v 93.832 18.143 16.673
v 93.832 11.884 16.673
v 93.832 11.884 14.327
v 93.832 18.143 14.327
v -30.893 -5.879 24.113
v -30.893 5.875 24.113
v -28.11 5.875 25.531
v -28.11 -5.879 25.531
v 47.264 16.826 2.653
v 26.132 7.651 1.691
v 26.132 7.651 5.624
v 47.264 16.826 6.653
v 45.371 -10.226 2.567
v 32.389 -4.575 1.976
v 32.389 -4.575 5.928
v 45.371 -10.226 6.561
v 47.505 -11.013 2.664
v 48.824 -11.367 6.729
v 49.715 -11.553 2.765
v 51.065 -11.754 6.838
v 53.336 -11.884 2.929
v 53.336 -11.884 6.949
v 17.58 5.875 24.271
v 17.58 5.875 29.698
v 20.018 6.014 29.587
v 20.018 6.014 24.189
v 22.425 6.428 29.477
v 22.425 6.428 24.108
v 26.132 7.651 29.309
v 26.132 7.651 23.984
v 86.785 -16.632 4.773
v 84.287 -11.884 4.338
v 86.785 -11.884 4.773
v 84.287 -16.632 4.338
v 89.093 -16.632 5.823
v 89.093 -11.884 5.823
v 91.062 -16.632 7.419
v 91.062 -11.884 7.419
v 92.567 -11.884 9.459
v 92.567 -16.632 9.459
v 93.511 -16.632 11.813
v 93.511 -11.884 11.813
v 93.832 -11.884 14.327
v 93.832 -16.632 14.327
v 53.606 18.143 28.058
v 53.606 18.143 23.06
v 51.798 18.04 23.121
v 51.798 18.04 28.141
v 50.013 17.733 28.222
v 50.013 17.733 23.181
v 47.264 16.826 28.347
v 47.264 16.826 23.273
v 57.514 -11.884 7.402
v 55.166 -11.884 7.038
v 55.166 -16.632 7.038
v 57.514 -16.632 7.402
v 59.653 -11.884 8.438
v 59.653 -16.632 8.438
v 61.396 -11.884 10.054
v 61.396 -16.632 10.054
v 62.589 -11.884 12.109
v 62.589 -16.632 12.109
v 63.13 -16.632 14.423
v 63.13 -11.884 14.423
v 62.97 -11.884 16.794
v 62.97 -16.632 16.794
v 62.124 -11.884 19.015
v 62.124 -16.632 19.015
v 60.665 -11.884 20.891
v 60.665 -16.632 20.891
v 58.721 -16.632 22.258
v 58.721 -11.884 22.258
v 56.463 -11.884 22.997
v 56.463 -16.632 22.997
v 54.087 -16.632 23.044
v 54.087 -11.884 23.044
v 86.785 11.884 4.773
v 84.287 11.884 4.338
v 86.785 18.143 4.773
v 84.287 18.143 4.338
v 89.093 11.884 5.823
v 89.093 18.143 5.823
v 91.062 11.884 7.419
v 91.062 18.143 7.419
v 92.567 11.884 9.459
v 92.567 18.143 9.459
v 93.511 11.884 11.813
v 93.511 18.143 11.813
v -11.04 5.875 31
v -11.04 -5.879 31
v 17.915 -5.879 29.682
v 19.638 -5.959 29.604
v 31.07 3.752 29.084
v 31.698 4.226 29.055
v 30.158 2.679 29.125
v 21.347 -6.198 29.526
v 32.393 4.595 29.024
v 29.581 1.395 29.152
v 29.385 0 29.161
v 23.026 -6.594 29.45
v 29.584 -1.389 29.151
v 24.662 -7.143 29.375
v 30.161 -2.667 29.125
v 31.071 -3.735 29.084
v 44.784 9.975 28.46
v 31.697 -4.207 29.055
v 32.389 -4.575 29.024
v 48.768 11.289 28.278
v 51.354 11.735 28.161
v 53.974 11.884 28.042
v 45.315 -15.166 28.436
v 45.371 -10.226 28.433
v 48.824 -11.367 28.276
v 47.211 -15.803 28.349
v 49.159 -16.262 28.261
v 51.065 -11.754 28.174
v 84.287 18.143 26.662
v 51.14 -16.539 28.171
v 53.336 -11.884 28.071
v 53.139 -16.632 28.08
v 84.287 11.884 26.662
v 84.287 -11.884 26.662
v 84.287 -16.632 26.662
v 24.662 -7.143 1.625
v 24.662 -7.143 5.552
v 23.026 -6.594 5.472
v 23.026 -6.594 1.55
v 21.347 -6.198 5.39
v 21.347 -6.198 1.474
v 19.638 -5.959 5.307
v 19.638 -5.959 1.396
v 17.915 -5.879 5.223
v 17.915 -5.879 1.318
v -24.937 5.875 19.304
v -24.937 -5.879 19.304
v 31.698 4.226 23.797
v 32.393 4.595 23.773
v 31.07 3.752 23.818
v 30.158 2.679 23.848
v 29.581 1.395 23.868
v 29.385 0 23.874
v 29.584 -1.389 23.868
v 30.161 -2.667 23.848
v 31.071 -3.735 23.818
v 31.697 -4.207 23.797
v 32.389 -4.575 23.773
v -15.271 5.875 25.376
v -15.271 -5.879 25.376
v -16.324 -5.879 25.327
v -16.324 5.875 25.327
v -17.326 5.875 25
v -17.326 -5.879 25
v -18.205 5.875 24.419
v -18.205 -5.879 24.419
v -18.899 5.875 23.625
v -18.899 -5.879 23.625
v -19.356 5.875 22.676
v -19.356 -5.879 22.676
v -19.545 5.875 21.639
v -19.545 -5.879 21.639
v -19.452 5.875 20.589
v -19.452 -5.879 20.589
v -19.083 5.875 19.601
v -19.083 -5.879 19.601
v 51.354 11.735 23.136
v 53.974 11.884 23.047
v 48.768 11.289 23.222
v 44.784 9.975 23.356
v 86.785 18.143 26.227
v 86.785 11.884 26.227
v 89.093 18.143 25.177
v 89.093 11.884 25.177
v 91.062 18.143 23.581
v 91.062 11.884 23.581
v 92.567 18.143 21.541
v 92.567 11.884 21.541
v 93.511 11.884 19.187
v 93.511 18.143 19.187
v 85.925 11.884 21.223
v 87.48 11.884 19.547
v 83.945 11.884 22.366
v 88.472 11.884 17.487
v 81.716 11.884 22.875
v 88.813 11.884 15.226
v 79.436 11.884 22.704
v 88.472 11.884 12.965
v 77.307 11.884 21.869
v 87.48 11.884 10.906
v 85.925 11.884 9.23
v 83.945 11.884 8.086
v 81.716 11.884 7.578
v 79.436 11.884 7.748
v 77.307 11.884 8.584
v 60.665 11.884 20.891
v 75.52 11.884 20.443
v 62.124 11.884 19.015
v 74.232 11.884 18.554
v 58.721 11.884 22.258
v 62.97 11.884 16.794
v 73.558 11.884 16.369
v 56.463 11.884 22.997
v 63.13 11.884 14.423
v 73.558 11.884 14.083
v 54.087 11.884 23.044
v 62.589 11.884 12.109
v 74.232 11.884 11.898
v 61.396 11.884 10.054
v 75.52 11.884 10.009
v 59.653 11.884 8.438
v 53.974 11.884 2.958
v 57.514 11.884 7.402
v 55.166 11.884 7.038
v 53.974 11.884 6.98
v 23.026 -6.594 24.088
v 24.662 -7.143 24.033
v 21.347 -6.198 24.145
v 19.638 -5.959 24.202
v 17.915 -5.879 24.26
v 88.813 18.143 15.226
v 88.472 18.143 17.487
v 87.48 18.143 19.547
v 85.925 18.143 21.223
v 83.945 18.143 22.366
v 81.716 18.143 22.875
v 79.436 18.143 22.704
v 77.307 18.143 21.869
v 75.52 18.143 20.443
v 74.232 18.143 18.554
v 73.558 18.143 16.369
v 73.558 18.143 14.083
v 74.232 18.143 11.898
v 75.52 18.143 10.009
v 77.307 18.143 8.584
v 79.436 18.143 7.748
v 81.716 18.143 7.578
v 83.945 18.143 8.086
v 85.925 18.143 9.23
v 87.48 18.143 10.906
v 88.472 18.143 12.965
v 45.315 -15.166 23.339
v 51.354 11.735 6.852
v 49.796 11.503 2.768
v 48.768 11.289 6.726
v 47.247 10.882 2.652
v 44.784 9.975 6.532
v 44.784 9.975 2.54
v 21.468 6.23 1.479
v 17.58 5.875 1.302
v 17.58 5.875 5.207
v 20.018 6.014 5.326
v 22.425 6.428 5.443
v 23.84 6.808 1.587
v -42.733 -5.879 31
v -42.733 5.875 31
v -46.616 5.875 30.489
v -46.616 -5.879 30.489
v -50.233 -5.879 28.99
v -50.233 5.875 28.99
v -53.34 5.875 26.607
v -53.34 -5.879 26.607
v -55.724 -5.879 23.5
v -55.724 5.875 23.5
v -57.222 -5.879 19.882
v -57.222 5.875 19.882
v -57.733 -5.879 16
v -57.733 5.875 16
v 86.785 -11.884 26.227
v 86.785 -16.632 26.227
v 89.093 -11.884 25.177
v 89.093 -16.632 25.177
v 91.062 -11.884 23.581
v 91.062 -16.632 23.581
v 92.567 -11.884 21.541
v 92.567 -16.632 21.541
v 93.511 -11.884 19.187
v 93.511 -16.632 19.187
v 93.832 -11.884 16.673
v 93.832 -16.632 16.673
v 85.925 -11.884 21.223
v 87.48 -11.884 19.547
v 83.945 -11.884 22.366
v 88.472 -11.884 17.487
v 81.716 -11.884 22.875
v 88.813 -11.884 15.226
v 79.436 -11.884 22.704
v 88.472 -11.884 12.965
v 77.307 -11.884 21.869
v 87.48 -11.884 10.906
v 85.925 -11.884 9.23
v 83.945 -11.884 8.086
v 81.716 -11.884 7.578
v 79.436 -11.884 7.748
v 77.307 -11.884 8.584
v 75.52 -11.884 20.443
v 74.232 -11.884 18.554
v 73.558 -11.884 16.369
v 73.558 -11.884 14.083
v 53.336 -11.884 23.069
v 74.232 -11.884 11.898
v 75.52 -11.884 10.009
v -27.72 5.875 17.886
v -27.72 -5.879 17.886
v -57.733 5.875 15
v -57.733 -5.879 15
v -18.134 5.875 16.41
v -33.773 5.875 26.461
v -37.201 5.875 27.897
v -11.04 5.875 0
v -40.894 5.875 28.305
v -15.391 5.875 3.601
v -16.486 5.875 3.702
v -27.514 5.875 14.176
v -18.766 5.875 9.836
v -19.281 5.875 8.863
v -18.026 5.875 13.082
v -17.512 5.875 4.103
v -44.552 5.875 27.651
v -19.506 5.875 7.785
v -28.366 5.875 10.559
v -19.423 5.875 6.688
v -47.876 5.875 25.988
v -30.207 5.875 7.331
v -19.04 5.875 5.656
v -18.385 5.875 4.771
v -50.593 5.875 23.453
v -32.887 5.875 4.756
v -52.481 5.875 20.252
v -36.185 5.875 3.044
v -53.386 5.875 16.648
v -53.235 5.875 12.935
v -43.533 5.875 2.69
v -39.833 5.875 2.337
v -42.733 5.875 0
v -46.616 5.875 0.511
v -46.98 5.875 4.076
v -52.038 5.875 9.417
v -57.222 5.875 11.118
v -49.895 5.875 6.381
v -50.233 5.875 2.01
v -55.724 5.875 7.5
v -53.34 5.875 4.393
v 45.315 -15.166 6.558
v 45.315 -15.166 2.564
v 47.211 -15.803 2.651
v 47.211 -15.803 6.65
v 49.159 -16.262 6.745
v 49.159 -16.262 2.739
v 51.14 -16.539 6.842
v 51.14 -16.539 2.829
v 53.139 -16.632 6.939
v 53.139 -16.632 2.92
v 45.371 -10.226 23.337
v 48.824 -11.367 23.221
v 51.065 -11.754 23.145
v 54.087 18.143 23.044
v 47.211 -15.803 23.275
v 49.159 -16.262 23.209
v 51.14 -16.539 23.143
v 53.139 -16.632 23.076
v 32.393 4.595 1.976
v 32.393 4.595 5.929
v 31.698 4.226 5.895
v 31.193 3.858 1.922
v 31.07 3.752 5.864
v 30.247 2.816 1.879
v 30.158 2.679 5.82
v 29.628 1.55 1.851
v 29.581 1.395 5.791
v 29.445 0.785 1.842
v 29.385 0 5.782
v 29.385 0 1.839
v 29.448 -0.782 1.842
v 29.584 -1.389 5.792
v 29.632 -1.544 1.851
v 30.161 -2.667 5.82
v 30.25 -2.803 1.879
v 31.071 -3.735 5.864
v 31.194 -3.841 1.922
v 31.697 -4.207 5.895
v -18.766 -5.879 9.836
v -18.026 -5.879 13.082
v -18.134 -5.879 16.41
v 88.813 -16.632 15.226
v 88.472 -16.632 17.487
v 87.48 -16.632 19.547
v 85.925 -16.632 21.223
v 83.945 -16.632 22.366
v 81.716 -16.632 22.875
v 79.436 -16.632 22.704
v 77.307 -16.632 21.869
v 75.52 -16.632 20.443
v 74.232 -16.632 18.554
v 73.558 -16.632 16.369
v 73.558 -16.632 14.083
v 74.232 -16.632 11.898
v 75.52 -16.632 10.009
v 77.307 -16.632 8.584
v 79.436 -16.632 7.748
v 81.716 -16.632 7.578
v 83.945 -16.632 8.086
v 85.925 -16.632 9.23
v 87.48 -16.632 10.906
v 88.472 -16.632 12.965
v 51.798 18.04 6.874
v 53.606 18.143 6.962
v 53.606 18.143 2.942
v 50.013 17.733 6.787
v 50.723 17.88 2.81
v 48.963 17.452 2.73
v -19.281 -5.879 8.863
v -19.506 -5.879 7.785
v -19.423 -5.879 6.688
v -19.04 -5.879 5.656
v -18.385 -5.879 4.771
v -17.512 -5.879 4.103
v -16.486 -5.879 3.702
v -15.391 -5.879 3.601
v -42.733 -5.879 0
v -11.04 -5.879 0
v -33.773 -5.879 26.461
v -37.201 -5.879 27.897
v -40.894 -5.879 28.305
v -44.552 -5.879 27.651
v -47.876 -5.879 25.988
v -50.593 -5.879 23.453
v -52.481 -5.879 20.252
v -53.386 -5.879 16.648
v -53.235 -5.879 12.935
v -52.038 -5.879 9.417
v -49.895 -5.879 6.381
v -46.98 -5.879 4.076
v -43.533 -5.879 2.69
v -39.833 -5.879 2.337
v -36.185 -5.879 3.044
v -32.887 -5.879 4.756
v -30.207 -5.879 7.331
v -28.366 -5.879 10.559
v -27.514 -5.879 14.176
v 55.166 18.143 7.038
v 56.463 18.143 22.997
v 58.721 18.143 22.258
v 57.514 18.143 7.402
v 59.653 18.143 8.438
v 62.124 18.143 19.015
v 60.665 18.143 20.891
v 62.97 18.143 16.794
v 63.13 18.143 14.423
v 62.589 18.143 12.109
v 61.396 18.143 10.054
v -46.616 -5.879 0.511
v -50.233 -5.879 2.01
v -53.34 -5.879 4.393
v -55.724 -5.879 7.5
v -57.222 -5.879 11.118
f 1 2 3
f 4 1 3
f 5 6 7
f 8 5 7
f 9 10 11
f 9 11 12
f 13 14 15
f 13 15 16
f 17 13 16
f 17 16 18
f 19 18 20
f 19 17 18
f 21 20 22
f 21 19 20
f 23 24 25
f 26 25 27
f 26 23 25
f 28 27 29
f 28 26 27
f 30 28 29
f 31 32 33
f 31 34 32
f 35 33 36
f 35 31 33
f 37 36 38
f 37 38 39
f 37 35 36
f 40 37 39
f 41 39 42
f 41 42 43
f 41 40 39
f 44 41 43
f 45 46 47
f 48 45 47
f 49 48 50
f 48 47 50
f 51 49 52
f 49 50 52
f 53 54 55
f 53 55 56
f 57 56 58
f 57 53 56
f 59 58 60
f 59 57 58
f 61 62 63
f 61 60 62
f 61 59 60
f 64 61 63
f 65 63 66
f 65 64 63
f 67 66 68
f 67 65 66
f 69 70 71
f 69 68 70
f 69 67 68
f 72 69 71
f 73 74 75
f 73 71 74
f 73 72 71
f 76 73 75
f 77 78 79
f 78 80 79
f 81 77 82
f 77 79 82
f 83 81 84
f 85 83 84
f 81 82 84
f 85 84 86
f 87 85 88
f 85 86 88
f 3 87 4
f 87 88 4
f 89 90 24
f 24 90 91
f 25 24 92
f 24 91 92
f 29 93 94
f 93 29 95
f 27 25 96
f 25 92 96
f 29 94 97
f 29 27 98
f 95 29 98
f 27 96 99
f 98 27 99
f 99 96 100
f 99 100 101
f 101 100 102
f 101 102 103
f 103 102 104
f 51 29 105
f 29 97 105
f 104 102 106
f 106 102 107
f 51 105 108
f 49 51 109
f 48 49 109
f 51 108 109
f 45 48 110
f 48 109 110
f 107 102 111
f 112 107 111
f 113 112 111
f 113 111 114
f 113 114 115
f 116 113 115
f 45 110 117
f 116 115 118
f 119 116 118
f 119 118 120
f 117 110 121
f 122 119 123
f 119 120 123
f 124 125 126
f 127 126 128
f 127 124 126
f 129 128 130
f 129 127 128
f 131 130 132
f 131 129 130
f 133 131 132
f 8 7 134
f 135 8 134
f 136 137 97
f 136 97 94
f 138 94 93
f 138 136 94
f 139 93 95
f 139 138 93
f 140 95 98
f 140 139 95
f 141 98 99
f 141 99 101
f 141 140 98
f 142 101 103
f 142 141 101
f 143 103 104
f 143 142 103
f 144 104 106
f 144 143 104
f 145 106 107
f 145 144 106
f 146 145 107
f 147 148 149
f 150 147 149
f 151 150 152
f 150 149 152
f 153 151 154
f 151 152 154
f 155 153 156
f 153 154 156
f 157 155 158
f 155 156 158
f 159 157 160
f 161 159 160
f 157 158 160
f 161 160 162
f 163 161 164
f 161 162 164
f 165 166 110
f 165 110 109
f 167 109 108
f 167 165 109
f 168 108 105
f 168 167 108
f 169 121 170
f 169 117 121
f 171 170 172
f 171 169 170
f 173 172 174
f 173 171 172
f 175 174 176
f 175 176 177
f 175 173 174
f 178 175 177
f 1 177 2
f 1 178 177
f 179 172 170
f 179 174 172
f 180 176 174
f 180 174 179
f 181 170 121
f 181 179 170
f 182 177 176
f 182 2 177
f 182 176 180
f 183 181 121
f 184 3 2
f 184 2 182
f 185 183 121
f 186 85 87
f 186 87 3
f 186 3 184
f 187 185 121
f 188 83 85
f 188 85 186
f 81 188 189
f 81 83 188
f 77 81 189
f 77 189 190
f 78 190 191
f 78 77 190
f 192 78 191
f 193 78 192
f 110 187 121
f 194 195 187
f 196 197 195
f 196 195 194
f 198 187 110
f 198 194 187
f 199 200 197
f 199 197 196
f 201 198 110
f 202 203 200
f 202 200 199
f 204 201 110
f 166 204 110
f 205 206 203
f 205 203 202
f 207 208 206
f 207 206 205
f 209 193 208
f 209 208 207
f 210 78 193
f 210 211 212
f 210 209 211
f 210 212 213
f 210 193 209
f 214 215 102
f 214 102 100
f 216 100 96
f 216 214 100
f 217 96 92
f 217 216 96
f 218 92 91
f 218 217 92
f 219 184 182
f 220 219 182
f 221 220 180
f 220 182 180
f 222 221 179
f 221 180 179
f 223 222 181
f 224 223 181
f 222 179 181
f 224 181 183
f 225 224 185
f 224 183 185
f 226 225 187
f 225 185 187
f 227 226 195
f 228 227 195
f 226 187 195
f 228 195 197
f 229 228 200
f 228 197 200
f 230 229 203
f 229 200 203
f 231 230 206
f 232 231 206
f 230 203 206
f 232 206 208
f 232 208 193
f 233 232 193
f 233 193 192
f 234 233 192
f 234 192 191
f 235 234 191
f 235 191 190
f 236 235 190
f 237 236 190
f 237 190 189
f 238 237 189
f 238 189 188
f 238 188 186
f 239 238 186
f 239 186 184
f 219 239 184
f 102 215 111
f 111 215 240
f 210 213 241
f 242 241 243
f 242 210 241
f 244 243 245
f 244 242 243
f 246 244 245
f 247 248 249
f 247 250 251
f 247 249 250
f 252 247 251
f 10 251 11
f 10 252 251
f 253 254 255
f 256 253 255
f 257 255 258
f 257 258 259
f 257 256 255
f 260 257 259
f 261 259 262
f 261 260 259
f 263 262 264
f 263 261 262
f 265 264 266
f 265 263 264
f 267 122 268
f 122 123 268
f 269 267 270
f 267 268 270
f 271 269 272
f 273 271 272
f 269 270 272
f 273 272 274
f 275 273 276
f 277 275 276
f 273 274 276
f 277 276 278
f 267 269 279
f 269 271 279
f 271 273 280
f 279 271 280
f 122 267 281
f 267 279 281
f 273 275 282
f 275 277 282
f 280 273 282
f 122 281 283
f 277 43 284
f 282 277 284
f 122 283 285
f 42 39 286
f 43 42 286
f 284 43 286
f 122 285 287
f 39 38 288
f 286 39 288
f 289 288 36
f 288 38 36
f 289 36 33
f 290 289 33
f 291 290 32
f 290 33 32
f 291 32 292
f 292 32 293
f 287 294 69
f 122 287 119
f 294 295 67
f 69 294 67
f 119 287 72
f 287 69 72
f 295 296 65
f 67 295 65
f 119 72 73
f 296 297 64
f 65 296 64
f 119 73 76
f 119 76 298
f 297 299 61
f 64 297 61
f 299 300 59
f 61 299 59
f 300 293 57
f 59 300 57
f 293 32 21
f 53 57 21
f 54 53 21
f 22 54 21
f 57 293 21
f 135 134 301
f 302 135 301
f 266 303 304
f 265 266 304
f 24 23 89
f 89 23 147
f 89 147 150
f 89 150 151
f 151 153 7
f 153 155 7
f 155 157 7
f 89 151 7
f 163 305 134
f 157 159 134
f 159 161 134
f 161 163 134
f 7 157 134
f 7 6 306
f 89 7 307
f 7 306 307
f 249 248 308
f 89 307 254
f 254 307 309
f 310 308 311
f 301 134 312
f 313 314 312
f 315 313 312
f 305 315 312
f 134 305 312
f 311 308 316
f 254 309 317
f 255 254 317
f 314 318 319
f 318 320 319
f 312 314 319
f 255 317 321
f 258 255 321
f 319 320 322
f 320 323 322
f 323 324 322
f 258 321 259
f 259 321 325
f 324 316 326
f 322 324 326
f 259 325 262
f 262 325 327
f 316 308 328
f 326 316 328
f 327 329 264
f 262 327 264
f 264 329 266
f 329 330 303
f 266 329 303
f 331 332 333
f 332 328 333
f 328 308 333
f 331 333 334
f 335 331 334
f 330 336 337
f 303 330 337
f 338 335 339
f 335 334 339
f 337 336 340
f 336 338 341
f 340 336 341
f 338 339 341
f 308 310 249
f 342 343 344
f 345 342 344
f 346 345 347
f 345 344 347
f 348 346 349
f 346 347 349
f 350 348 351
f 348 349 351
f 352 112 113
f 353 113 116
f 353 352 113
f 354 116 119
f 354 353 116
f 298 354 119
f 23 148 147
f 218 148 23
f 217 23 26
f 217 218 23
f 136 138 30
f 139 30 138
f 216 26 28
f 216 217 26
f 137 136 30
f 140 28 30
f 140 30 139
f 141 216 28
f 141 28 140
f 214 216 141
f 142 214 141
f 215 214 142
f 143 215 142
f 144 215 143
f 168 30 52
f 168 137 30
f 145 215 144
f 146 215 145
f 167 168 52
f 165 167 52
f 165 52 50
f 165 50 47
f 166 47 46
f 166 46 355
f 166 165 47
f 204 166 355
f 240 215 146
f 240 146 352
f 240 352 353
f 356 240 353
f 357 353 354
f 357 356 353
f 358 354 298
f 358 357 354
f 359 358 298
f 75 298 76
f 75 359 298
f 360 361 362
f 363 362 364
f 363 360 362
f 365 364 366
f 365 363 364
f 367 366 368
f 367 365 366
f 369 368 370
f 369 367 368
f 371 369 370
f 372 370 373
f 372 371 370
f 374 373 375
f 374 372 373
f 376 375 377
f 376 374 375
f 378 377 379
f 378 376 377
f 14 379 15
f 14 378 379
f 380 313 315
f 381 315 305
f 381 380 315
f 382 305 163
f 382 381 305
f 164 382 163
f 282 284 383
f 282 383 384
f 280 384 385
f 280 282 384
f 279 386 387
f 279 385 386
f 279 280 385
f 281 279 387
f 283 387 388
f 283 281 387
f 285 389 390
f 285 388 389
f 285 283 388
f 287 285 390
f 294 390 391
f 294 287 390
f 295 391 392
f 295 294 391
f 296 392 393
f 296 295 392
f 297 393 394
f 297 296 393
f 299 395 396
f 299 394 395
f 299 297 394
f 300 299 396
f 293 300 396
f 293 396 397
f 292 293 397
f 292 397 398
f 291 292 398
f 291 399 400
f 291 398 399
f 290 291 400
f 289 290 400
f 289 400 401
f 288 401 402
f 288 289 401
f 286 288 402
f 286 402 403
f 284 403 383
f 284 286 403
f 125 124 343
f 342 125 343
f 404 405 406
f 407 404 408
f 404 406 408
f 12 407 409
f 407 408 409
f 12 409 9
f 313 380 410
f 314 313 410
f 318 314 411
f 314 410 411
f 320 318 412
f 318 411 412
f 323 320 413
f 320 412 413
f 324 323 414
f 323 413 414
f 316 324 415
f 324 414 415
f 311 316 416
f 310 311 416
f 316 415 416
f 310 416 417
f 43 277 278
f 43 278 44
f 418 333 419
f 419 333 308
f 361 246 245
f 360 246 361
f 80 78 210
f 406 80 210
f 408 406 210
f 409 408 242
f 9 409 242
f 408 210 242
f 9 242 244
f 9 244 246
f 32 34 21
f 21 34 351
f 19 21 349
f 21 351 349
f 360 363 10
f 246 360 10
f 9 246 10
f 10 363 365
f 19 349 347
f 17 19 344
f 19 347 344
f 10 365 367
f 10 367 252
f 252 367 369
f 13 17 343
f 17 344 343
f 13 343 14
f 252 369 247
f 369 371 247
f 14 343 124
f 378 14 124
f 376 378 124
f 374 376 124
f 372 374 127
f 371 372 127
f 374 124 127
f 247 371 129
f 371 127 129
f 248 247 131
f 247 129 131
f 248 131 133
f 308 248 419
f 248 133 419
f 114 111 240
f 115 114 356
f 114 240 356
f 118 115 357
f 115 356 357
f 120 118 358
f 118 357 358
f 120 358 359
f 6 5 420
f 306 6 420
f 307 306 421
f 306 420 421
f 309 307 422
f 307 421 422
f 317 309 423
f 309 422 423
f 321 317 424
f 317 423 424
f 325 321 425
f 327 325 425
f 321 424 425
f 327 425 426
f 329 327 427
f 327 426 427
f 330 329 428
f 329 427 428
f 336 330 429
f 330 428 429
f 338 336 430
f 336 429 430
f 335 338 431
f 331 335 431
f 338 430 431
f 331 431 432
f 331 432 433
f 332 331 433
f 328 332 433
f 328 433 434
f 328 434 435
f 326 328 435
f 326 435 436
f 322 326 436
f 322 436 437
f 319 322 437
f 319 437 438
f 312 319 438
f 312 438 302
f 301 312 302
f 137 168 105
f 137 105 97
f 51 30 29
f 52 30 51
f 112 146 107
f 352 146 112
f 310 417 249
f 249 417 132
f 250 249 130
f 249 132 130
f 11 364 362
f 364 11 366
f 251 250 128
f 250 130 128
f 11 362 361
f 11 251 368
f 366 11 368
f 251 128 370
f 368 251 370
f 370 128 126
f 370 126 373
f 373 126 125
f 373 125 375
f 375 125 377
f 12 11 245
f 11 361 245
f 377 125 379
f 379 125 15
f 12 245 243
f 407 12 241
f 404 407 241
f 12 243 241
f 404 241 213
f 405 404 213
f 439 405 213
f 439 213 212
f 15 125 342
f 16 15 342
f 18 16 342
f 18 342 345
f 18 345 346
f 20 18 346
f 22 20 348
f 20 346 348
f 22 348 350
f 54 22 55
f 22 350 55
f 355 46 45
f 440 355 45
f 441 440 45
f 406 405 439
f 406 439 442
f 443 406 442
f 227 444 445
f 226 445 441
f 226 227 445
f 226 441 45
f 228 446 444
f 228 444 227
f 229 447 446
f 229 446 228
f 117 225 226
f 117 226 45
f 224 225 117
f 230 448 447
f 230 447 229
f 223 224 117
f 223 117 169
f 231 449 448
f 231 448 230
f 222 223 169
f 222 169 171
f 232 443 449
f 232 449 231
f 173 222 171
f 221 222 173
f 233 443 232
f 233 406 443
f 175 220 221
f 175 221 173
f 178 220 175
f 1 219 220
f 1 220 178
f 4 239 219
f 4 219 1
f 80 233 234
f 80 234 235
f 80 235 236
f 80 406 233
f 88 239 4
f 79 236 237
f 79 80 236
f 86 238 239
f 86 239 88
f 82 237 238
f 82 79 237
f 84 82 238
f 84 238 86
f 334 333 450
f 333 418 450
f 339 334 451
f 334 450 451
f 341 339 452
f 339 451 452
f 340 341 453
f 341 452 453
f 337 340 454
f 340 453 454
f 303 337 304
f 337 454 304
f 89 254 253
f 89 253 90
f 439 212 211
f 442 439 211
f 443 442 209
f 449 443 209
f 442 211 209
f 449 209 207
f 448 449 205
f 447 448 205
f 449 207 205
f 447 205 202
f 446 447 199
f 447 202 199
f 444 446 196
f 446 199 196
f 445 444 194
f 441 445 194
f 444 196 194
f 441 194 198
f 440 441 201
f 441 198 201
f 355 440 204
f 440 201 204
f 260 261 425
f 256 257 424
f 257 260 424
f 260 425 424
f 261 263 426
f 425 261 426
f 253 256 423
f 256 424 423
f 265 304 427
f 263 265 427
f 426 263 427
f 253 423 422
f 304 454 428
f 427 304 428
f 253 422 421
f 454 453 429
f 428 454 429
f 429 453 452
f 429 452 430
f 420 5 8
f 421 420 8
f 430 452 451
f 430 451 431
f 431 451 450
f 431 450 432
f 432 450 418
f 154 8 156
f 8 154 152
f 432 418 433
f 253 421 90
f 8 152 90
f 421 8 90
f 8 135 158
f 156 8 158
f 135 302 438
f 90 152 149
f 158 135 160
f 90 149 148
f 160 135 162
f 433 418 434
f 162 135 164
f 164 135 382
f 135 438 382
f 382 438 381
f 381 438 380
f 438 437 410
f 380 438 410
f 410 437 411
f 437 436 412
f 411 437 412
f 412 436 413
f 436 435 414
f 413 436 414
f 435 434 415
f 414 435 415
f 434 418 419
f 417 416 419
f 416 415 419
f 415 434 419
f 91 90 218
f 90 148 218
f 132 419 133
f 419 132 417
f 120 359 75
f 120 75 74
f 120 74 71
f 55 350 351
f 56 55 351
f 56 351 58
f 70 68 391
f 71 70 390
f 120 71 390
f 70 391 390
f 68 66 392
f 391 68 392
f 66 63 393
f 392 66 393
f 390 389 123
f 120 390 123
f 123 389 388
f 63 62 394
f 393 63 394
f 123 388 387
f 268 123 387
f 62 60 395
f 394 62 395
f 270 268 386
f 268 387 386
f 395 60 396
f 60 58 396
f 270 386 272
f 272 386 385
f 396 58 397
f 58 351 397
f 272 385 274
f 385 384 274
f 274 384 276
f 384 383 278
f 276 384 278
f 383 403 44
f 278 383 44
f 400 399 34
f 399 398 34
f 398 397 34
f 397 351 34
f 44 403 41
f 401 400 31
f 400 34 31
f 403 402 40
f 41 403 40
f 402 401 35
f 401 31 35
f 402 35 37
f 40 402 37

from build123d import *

# Parameters (mm, degrees)
PAD_DEPTH            = 31
FILLET_R             = 15
POCKET_DEPTH         = 24.023168
FILLET001_R          = 15
POCKET001_DEPTH      = 18.144337
POCKET001_DEPTH_BACK = -16.633037
FILLET002_R          = 10
SKETCH003_R          = 7.670171
POCKET002_DEPTH      = 18.144337
POCKET002_DEPTH_BACK = -16.633037
POCKET003_DEPTH      = 18.144337
POCKET003_DEPTH_BACK = -16.633037


with BuildPart() as part:
    # Sketch → Pad (new body)
    with BuildSketch(Plane.XY):
        with BuildLine():
            Line((17.5802, 5.874869), (-57.733299, 5.874869))
            Line((-57.733299, 5.874869), (-57.733299, -5.878831))
            Line((-57.733299, -5.878831), (17.914803, -5.878831))
            ThreePointArc((24.661976, -7.143267), (21.347118, -6.197668), (17.914803, -5.878831))
            Line((24.661976, -7.143267), (45.314852, -15.165812))
            ThreePointArc((45.314852, -15.165812), (49.158723, -16.262318), (53.138796, -16.632037))
            Line((53.138796, -16.632037), (98.306877, -16.632037))
            Line((98.306877, -16.632037), (98.306877, -11.884055))
            Line((98.306877, -11.884055), (53.335909, -11.884055))
            ThreePointArc((45.371277, -10.225885), (49.268204, -11.465115), (53.335909, -11.884055))
            Line((32.389291, -4.575495), (45.371277, -10.225885))
            ThreePointArc((32.39346, 4.595455), (29.384719, 0.011347), (32.389291, -4.575495))
            Line((44.784154, 9.975093), (32.39346, 4.595455))
            ThreePointArc((53.974339, 11.884055), (49.281162, 11.401775), (44.784154, 9.975093))
            Line((98.300218, 11.884055), (53.974339, 11.884055))
            Line((98.300218, 18.143337), (98.300218, 11.884055))
            Line((53.605767, 18.143337), (98.300218, 18.143337))
            ThreePointArc((53.605767, 18.143337), (50.367046, 17.81052), (47.2637, 16.825979))
            Line((26.131771, 7.651179), (47.2637, 16.825979))
            ThreePointArc((17.5802, 5.874869), (21.947254, 6.323636), (26.131771, 7.651179))
        make_face()
    extrude(amount=PAD_DEPTH)

    # Fillet
    fillet_edges = [part.edges().sort_by_distance(p)[0] for p in [
        (98.306877, -14.258046, 31),
        (98.300218, 15.013696, 31),
        (98.306877, -14.258046, 0),
        (98.300218, 15.013696, 0),
    ]]
    fillet(fillet_edges, radius=FILLET_R)

    # Sketch001 (on Face13 of Fillet) → Pocket (cut, through all)
    with BuildSketch(Plane(origin=(3, -5.878831, 20), x_dir=(0.891007, 0, 0.45399), z_dir=(0, -1, 0))):
        with BuildLine():
            ThreePointArc((-28.331719, 19.051588), (-53.844012, 15.55741), (-28.331719, 12.063232))
            Line((-25.207983, 12.063232), (-28.331719, 12.063232))
            Line((-25.207983, 19.051588), (-25.207983, 12.063232))
            Line((-28.331719, 19.051588), (-25.207983, 19.051588))
        make_face()
    extrude(amount=-POCKET_DEPTH, mode=Mode.SUBTRACT)

    # Fillet001
    fillet001_edges = [part.edges().sort_by_distance(p)[0] for p in [
        (-57.733299, -0.001981, 31),
        (-57.733299, -0.001981, 0),
    ]]
    fillet(fillet001_edges, radius=FILLET001_R)

    # Sketch002 → Pocket001 (cut, two sides)
    with BuildSketch(Plane.XZ) as pocket001_sk:
        Polygon((-48.132477, 32.687893), (93.832344, 26.227839), (93.832344, 4.772161), (-48.132477, -1.687893), (-48.132477, -33.037488), (136.738275, -33.037488), (136.738275, 64.037488), (-48.132477, 64.037488), align=None)
    extrude(amount=-POCKET001_DEPTH, mode=Mode.SUBTRACT)
    extrude(pocket001_sk.sketch, amount=-POCKET001_DEPTH_BACK, mode=Mode.SUBTRACT)

    # Fillet002
    fillet002_edges = [part.edges().sort_by_distance(p)[0] for p in [
        (93.832344, 15.013696, 26.227839),
        (93.832344, -14.258046, 26.227839),
        (93.832344, 15.013696, 4.772161),
        (93.832344, -14.258046, 4.772161),
    ]]
    fillet(fillet002_edges, radius=FILLET002_R)

    # Sketch003 → Pocket002 (cut, two sides)
    with BuildSketch(Plane.XZ) as pocket002_sk:
        with Locations((81.142525, 15.22629)):
            Circle(SKETCH003_R)
    extrude(amount=-POCKET002_DEPTH, mode=Mode.SUBTRACT)
    extrude(pocket002_sk.sketch, amount=-POCKET002_DEPTH_BACK, mode=Mode.SUBTRACT)

    # Sketch004 → Pocket003 (cut, two sides)
    with BuildSketch(Plane.XZ) as pocket003_sk:
        with BuildLine():
            ThreePointArc((-15.271182, 25.376072), (-18.898724, 23.62511), (-19.082655, 19.601294))
            ThreePointArc((-18.766414, 9.83565), (-17.972747, 14.749294), (-19.082655, 19.601294))
            ThreePointArc((-18.766414, 9.83565), (-19.039764, 5.656397), (-15.390545, 3.601138))
            Line((-15.390545, 3.601138), (55.165915, 7.037659))
            ThreePointArc((55.165915, 7.037659), (63.138146, 15.614512), (54.086796, 23.043639))
            Line((-15.271182, 25.376072), (54.086796, 23.043639))
        make_face()
    extrude(amount=-POCKET003_DEPTH, mode=Mode.SUBTRACT)
    extrude(pocket003_sk.sketch, amount=-POCKET003_DEPTH_BACK, mode=Mode.SUBTRACT)


solid = part.part
